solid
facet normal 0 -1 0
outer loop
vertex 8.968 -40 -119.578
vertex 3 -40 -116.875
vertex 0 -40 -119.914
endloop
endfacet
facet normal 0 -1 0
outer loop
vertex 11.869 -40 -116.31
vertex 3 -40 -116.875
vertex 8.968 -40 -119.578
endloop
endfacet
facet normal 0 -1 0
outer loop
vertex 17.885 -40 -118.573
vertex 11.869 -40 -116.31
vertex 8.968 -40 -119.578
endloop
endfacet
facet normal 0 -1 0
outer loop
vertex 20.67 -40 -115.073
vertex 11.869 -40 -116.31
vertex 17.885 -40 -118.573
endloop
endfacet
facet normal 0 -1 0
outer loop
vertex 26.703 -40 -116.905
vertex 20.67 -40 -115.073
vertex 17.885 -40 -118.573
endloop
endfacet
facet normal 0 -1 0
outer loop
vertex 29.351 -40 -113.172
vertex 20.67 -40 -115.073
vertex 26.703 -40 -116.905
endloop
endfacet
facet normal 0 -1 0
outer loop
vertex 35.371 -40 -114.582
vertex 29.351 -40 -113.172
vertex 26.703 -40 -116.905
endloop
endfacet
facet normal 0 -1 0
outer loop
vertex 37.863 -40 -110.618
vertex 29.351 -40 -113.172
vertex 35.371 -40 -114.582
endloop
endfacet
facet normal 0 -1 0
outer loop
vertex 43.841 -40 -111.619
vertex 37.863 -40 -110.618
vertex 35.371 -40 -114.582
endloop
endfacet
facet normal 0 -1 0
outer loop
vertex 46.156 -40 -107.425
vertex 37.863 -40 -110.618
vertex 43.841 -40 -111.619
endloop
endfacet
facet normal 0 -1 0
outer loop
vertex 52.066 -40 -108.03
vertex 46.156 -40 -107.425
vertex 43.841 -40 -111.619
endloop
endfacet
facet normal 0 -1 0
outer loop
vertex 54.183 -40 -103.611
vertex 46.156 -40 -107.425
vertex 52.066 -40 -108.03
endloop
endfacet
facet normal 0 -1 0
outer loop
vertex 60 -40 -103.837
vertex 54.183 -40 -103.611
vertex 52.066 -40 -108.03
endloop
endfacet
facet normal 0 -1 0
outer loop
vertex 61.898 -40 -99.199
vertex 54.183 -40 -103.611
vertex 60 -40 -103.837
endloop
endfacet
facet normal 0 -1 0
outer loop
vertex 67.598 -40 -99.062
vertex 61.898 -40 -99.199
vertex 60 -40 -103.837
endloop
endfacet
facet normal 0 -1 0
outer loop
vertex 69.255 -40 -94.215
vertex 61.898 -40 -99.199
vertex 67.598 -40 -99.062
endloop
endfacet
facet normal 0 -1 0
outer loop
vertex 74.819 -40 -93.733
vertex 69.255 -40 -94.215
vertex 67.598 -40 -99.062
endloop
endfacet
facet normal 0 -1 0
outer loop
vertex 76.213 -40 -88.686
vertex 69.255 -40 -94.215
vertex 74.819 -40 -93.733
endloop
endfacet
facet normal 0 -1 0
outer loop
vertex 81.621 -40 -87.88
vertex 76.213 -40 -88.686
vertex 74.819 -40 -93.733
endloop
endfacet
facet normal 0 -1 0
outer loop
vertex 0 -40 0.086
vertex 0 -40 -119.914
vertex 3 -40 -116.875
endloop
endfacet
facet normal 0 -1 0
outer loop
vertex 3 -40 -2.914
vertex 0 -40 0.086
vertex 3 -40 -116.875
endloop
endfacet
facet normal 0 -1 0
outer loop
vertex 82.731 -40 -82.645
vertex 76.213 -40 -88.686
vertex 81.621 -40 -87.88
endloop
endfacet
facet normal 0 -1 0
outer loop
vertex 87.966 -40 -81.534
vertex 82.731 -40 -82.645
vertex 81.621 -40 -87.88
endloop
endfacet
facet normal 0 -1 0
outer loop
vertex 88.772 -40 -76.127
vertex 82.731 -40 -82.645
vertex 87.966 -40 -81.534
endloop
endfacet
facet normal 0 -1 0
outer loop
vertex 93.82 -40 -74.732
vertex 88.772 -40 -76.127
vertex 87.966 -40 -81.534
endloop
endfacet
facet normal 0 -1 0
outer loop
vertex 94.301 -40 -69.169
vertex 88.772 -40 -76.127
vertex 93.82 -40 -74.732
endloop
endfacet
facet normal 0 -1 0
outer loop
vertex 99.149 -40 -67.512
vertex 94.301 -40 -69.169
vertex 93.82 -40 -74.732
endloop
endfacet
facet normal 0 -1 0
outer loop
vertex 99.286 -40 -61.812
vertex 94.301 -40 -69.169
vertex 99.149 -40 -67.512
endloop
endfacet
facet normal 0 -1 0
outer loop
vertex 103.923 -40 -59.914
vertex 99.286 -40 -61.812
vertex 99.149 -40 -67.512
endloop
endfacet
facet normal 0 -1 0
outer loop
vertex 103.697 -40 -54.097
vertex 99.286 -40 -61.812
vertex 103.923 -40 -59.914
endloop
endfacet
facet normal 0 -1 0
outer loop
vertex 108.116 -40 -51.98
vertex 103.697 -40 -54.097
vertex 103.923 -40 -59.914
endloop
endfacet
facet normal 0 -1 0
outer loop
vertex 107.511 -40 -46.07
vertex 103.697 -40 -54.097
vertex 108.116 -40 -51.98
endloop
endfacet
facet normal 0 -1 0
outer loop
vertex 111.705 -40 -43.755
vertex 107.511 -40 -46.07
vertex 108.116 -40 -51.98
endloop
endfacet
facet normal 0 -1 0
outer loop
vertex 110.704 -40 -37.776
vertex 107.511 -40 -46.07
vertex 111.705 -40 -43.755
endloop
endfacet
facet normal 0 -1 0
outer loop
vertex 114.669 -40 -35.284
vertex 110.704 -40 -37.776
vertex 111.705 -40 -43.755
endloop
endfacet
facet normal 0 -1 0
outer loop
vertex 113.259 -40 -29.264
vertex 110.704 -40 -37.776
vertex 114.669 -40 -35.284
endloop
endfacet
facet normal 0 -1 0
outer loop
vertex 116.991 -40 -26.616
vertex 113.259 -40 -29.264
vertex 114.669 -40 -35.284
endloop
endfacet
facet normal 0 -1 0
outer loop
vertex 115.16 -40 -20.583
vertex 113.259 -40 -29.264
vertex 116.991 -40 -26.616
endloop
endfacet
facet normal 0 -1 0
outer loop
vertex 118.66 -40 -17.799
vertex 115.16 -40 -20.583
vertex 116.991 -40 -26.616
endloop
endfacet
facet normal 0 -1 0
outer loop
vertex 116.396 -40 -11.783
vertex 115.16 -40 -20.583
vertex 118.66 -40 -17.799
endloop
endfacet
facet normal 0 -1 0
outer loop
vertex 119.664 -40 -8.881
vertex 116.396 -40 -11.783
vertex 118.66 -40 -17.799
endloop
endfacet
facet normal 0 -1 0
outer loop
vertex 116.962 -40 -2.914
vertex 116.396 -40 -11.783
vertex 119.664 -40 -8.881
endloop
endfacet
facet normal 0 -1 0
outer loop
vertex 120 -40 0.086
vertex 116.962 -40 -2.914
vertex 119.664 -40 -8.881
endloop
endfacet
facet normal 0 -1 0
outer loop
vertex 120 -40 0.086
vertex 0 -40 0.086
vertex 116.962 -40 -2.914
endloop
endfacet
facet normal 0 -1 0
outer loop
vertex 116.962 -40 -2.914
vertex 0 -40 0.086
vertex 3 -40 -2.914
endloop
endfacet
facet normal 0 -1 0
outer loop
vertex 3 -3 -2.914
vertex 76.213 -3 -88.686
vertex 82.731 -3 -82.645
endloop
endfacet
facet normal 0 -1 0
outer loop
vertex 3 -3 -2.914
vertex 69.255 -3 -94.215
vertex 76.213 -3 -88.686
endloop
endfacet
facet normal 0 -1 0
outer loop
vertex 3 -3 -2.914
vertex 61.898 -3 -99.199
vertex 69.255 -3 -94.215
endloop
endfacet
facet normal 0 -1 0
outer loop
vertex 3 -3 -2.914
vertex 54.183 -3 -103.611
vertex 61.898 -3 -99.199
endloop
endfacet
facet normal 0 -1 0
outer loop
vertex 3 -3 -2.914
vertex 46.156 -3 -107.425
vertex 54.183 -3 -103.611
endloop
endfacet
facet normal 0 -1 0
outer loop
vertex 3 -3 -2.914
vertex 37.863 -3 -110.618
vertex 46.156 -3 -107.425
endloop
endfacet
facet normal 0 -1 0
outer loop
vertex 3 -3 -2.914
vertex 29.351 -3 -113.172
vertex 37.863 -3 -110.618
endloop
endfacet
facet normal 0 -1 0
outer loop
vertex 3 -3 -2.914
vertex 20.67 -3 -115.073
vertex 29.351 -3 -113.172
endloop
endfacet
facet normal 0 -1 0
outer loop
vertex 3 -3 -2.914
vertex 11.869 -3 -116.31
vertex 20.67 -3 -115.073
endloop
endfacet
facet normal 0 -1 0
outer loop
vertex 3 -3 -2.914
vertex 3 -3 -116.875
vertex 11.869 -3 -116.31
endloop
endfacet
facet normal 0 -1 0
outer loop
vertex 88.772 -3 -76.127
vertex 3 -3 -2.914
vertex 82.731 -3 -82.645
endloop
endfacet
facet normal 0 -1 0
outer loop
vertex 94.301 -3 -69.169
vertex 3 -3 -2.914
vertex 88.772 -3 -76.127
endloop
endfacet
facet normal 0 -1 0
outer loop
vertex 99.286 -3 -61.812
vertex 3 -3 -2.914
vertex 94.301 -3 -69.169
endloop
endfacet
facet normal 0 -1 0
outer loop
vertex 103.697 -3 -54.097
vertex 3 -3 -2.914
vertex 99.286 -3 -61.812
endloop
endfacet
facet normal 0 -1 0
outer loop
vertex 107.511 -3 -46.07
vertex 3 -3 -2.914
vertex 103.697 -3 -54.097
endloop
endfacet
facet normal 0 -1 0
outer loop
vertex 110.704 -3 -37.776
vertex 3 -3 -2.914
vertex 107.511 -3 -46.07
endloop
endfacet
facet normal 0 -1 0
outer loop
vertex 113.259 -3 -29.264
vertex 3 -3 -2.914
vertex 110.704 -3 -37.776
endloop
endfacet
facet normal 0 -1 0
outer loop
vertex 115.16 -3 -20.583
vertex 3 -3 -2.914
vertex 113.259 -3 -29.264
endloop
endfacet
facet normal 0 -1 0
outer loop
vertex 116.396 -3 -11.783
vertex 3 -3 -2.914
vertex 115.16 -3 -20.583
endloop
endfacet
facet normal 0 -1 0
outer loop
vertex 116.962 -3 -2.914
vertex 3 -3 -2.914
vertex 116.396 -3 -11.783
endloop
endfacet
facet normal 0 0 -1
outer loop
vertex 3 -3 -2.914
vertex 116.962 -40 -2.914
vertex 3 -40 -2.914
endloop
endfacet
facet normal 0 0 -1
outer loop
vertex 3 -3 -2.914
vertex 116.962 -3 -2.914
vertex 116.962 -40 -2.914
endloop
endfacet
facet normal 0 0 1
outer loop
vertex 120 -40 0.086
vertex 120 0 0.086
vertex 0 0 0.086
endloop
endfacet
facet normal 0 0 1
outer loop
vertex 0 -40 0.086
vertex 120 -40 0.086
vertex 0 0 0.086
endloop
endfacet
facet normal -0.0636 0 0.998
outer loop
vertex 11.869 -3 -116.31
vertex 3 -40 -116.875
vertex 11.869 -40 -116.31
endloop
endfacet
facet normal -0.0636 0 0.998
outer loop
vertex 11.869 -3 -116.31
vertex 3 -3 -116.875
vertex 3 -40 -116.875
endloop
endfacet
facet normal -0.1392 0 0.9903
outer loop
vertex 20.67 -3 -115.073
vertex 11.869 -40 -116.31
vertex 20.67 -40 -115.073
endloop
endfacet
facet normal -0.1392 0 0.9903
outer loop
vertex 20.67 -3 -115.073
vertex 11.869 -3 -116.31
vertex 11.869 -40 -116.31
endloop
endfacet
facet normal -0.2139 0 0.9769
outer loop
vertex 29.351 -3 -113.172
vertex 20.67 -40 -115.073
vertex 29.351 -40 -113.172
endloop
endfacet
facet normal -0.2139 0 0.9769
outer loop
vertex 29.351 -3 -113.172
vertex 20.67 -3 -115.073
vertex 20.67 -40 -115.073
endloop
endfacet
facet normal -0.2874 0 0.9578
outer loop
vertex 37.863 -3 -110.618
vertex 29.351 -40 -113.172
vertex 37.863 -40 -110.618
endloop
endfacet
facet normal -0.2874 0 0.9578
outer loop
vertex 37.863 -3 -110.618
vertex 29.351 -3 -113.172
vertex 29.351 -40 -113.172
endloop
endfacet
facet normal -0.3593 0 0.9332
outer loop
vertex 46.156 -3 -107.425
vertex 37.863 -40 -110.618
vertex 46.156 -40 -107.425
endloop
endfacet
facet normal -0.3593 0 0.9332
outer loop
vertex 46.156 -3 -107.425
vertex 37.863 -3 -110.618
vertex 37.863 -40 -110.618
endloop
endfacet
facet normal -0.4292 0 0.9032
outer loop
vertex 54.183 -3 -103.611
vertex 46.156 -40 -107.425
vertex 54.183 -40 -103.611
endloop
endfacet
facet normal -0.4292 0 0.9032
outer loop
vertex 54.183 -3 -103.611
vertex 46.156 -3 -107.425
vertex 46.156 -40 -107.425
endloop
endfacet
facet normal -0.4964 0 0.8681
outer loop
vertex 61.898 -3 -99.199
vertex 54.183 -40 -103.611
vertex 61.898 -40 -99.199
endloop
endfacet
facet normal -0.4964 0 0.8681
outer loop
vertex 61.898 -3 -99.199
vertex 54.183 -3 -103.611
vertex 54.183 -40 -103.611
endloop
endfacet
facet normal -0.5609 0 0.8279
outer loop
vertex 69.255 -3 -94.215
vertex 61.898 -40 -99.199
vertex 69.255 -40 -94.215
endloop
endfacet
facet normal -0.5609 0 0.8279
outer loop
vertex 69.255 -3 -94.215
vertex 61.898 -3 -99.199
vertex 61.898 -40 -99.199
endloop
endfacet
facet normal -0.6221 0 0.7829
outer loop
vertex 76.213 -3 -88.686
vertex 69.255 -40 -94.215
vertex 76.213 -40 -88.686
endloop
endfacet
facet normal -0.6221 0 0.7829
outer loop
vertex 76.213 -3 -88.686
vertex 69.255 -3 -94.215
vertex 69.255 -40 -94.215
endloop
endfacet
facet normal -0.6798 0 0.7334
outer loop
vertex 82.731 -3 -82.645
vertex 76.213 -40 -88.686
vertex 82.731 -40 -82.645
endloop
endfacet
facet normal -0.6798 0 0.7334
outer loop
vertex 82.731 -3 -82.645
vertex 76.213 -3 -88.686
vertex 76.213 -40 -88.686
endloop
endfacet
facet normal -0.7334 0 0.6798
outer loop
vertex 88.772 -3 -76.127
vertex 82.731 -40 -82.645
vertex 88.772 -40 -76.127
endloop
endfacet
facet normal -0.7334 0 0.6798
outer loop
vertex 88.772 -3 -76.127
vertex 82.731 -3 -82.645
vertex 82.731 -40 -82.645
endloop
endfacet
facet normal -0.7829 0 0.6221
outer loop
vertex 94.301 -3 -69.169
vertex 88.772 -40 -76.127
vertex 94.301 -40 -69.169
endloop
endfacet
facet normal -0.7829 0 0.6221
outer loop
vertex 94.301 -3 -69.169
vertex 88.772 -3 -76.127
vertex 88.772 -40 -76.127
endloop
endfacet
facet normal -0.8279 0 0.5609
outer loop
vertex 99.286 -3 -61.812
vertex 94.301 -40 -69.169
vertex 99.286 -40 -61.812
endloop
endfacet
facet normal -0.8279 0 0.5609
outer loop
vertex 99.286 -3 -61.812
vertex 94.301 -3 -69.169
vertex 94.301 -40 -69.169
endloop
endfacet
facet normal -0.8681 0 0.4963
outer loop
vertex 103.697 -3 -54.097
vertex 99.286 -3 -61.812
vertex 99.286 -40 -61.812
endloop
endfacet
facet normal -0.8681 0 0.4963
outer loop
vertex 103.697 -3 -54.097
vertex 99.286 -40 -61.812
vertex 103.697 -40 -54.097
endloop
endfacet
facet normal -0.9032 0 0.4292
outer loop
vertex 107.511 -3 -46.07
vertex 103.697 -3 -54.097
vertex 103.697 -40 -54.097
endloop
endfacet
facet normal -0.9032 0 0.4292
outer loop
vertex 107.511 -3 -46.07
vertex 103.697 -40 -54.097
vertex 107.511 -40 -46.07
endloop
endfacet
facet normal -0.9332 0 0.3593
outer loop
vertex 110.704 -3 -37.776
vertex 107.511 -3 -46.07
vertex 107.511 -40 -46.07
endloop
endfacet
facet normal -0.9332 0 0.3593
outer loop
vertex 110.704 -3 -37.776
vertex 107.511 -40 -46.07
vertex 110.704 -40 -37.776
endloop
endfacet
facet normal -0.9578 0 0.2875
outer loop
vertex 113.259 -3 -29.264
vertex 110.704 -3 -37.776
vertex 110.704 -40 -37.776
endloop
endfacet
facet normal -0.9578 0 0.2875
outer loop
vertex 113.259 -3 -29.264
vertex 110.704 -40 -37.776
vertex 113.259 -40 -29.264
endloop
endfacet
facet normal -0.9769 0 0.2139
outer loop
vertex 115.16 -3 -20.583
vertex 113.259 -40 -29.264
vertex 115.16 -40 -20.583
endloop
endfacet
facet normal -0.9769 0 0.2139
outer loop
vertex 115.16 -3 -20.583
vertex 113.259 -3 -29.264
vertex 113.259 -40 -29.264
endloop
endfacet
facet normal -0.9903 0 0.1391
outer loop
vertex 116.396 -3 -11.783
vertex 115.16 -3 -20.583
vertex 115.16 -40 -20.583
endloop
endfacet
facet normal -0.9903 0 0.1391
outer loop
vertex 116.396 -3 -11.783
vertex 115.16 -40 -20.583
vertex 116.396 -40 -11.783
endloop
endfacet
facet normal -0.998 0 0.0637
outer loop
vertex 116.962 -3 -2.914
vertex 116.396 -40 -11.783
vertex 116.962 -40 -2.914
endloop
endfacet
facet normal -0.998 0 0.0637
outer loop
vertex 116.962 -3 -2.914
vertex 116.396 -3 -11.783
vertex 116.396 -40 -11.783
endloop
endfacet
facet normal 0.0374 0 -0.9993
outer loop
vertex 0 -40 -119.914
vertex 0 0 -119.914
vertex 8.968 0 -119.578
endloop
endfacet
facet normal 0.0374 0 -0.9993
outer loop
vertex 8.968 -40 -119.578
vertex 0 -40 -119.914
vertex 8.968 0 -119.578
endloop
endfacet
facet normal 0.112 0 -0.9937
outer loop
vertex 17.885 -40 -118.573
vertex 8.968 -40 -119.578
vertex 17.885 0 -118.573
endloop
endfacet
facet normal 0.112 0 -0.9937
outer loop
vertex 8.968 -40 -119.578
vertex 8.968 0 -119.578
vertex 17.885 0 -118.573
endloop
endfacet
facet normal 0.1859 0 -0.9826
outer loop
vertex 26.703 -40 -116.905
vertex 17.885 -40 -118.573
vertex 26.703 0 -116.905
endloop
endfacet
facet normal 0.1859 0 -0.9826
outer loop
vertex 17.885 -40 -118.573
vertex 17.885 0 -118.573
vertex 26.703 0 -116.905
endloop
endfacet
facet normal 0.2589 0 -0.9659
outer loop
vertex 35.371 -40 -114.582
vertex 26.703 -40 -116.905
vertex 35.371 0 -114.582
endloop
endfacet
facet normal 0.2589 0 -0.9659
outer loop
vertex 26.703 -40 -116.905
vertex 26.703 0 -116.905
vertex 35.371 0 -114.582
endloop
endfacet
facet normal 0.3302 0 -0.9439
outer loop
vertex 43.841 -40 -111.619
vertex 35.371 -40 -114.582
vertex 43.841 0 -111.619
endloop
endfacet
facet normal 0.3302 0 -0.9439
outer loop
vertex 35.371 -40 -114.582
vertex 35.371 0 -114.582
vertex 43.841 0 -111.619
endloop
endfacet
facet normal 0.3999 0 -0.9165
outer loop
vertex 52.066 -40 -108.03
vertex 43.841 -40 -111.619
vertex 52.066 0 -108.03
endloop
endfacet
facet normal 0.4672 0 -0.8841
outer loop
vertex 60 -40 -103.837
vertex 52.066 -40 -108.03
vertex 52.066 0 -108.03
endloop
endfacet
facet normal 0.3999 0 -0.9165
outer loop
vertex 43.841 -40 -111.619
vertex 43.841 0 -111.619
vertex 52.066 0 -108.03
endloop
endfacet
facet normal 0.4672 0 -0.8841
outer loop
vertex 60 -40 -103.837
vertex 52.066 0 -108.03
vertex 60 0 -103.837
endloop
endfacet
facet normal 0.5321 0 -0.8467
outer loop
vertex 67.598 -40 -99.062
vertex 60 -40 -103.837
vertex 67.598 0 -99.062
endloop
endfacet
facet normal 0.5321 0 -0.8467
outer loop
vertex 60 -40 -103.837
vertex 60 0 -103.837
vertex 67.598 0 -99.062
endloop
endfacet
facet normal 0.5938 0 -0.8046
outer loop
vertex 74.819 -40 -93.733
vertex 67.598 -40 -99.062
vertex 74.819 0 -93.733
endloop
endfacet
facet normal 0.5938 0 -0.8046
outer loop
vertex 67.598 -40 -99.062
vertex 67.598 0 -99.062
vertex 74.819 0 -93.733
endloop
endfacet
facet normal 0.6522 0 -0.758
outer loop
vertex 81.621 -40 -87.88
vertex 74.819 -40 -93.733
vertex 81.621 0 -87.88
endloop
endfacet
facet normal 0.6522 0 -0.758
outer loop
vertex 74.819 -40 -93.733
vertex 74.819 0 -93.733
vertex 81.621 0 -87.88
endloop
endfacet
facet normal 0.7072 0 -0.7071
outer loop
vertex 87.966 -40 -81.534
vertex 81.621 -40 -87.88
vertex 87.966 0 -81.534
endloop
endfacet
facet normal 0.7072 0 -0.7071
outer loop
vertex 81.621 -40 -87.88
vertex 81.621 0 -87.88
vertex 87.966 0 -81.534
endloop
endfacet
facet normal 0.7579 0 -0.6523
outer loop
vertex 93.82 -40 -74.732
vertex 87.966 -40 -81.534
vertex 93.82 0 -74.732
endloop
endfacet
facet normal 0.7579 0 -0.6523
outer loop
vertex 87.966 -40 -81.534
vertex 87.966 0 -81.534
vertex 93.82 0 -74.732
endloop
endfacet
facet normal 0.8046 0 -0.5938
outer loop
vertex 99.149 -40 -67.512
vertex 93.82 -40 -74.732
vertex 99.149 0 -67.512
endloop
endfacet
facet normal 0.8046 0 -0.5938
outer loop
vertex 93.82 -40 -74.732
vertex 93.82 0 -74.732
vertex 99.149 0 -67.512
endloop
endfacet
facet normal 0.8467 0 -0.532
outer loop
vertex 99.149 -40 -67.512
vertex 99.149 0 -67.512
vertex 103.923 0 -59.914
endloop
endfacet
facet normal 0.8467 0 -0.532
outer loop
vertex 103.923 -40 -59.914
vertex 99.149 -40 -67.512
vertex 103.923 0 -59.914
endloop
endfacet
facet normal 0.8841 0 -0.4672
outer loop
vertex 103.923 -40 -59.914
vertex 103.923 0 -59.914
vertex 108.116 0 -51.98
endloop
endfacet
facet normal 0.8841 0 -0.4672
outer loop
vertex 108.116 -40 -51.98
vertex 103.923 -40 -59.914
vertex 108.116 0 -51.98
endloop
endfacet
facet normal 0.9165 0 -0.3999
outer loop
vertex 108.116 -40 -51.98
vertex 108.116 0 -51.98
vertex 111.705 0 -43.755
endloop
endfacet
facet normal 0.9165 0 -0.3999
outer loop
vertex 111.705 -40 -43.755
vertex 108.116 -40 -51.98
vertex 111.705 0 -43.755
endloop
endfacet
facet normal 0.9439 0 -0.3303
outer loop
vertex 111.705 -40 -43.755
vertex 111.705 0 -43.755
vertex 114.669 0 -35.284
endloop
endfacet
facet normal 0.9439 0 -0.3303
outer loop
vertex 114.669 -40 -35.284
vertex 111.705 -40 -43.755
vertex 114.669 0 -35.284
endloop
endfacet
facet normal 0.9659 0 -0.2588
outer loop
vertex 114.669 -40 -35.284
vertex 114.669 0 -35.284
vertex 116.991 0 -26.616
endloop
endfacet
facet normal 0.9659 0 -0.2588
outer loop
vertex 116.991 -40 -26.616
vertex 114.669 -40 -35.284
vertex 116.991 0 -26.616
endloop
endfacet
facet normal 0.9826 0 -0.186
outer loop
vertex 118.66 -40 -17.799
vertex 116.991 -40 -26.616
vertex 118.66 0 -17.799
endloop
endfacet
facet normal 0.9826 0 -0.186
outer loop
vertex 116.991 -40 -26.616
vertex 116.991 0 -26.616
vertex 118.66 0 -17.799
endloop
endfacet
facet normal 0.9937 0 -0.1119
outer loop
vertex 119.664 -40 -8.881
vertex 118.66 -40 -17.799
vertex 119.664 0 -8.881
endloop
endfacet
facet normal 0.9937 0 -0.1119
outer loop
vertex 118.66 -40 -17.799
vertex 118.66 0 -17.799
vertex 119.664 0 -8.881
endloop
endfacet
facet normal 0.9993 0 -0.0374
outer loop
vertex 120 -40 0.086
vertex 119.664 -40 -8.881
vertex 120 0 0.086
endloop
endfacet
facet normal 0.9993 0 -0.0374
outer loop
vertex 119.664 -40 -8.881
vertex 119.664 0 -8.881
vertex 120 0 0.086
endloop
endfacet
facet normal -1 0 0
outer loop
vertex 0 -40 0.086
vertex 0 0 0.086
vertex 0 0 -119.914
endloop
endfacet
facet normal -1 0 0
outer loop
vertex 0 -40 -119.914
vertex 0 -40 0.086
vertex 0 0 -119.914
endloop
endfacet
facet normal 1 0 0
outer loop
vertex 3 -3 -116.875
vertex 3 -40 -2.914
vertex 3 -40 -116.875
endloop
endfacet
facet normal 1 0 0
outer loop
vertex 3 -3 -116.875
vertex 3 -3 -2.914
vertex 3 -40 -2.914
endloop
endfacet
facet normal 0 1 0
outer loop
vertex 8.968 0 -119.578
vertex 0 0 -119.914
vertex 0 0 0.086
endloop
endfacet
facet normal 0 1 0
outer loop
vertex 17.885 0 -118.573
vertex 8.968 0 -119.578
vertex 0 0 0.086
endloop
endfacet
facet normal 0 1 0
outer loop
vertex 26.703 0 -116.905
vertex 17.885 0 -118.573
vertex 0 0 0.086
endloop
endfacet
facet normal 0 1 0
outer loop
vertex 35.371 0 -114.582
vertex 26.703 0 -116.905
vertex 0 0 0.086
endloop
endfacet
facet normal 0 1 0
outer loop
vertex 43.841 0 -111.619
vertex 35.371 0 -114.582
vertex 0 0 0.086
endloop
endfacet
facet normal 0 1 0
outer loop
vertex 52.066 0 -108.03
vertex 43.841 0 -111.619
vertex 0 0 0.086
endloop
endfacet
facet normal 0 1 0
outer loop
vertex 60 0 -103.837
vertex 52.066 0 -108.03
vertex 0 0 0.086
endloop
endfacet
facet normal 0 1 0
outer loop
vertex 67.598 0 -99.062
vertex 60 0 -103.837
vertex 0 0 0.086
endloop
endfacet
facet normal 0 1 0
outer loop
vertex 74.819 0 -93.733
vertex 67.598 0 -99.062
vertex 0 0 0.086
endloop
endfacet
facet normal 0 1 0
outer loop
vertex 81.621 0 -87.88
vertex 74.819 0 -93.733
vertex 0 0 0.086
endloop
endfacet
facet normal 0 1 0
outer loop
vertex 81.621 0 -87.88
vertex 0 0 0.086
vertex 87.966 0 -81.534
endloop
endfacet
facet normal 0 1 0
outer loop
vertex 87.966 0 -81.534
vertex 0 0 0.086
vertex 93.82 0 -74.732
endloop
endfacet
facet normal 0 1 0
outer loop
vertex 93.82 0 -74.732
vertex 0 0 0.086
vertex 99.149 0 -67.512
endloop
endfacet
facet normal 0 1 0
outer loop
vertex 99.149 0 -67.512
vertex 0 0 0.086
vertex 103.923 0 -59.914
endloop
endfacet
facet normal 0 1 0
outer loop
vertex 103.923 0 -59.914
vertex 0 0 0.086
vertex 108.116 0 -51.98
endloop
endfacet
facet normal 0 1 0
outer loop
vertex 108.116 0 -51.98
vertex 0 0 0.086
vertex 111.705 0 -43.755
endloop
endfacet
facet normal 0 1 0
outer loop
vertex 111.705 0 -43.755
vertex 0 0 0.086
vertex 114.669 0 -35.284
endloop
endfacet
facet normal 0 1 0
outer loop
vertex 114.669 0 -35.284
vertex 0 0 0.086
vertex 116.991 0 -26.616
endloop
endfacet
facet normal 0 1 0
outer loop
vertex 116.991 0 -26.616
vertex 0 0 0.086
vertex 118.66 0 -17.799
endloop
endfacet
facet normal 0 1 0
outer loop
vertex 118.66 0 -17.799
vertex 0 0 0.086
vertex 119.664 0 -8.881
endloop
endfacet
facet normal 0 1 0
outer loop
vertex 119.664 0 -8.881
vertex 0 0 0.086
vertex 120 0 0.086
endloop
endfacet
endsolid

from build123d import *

# Parameters (mm, degrees)
F1_DEPTH = 40
F2_T     = -3


with BuildPart() as f1:
    # F0 (on Front) → F1 (new body)
    with BuildSketch(Plane.XZ):
        with BuildLine():
            Line((0, 0.086318), (0, -119.913682))
            ThreePointArc((0, -119.913682), (84.852814, -84.766496), (120, 0.086318))
            Line((120, 0.086318), (0, 0.086318))
        make_face()
    extrude(amount=F1_DEPTH)

    # F2
    f2_openings = [f1.faces().sort_by_distance(p)[0] for p in [
        (50.929582, -40, -50.843264),
    ]]
    offset(amount=F2_T, openings=f2_openings)


solid = f1.part
